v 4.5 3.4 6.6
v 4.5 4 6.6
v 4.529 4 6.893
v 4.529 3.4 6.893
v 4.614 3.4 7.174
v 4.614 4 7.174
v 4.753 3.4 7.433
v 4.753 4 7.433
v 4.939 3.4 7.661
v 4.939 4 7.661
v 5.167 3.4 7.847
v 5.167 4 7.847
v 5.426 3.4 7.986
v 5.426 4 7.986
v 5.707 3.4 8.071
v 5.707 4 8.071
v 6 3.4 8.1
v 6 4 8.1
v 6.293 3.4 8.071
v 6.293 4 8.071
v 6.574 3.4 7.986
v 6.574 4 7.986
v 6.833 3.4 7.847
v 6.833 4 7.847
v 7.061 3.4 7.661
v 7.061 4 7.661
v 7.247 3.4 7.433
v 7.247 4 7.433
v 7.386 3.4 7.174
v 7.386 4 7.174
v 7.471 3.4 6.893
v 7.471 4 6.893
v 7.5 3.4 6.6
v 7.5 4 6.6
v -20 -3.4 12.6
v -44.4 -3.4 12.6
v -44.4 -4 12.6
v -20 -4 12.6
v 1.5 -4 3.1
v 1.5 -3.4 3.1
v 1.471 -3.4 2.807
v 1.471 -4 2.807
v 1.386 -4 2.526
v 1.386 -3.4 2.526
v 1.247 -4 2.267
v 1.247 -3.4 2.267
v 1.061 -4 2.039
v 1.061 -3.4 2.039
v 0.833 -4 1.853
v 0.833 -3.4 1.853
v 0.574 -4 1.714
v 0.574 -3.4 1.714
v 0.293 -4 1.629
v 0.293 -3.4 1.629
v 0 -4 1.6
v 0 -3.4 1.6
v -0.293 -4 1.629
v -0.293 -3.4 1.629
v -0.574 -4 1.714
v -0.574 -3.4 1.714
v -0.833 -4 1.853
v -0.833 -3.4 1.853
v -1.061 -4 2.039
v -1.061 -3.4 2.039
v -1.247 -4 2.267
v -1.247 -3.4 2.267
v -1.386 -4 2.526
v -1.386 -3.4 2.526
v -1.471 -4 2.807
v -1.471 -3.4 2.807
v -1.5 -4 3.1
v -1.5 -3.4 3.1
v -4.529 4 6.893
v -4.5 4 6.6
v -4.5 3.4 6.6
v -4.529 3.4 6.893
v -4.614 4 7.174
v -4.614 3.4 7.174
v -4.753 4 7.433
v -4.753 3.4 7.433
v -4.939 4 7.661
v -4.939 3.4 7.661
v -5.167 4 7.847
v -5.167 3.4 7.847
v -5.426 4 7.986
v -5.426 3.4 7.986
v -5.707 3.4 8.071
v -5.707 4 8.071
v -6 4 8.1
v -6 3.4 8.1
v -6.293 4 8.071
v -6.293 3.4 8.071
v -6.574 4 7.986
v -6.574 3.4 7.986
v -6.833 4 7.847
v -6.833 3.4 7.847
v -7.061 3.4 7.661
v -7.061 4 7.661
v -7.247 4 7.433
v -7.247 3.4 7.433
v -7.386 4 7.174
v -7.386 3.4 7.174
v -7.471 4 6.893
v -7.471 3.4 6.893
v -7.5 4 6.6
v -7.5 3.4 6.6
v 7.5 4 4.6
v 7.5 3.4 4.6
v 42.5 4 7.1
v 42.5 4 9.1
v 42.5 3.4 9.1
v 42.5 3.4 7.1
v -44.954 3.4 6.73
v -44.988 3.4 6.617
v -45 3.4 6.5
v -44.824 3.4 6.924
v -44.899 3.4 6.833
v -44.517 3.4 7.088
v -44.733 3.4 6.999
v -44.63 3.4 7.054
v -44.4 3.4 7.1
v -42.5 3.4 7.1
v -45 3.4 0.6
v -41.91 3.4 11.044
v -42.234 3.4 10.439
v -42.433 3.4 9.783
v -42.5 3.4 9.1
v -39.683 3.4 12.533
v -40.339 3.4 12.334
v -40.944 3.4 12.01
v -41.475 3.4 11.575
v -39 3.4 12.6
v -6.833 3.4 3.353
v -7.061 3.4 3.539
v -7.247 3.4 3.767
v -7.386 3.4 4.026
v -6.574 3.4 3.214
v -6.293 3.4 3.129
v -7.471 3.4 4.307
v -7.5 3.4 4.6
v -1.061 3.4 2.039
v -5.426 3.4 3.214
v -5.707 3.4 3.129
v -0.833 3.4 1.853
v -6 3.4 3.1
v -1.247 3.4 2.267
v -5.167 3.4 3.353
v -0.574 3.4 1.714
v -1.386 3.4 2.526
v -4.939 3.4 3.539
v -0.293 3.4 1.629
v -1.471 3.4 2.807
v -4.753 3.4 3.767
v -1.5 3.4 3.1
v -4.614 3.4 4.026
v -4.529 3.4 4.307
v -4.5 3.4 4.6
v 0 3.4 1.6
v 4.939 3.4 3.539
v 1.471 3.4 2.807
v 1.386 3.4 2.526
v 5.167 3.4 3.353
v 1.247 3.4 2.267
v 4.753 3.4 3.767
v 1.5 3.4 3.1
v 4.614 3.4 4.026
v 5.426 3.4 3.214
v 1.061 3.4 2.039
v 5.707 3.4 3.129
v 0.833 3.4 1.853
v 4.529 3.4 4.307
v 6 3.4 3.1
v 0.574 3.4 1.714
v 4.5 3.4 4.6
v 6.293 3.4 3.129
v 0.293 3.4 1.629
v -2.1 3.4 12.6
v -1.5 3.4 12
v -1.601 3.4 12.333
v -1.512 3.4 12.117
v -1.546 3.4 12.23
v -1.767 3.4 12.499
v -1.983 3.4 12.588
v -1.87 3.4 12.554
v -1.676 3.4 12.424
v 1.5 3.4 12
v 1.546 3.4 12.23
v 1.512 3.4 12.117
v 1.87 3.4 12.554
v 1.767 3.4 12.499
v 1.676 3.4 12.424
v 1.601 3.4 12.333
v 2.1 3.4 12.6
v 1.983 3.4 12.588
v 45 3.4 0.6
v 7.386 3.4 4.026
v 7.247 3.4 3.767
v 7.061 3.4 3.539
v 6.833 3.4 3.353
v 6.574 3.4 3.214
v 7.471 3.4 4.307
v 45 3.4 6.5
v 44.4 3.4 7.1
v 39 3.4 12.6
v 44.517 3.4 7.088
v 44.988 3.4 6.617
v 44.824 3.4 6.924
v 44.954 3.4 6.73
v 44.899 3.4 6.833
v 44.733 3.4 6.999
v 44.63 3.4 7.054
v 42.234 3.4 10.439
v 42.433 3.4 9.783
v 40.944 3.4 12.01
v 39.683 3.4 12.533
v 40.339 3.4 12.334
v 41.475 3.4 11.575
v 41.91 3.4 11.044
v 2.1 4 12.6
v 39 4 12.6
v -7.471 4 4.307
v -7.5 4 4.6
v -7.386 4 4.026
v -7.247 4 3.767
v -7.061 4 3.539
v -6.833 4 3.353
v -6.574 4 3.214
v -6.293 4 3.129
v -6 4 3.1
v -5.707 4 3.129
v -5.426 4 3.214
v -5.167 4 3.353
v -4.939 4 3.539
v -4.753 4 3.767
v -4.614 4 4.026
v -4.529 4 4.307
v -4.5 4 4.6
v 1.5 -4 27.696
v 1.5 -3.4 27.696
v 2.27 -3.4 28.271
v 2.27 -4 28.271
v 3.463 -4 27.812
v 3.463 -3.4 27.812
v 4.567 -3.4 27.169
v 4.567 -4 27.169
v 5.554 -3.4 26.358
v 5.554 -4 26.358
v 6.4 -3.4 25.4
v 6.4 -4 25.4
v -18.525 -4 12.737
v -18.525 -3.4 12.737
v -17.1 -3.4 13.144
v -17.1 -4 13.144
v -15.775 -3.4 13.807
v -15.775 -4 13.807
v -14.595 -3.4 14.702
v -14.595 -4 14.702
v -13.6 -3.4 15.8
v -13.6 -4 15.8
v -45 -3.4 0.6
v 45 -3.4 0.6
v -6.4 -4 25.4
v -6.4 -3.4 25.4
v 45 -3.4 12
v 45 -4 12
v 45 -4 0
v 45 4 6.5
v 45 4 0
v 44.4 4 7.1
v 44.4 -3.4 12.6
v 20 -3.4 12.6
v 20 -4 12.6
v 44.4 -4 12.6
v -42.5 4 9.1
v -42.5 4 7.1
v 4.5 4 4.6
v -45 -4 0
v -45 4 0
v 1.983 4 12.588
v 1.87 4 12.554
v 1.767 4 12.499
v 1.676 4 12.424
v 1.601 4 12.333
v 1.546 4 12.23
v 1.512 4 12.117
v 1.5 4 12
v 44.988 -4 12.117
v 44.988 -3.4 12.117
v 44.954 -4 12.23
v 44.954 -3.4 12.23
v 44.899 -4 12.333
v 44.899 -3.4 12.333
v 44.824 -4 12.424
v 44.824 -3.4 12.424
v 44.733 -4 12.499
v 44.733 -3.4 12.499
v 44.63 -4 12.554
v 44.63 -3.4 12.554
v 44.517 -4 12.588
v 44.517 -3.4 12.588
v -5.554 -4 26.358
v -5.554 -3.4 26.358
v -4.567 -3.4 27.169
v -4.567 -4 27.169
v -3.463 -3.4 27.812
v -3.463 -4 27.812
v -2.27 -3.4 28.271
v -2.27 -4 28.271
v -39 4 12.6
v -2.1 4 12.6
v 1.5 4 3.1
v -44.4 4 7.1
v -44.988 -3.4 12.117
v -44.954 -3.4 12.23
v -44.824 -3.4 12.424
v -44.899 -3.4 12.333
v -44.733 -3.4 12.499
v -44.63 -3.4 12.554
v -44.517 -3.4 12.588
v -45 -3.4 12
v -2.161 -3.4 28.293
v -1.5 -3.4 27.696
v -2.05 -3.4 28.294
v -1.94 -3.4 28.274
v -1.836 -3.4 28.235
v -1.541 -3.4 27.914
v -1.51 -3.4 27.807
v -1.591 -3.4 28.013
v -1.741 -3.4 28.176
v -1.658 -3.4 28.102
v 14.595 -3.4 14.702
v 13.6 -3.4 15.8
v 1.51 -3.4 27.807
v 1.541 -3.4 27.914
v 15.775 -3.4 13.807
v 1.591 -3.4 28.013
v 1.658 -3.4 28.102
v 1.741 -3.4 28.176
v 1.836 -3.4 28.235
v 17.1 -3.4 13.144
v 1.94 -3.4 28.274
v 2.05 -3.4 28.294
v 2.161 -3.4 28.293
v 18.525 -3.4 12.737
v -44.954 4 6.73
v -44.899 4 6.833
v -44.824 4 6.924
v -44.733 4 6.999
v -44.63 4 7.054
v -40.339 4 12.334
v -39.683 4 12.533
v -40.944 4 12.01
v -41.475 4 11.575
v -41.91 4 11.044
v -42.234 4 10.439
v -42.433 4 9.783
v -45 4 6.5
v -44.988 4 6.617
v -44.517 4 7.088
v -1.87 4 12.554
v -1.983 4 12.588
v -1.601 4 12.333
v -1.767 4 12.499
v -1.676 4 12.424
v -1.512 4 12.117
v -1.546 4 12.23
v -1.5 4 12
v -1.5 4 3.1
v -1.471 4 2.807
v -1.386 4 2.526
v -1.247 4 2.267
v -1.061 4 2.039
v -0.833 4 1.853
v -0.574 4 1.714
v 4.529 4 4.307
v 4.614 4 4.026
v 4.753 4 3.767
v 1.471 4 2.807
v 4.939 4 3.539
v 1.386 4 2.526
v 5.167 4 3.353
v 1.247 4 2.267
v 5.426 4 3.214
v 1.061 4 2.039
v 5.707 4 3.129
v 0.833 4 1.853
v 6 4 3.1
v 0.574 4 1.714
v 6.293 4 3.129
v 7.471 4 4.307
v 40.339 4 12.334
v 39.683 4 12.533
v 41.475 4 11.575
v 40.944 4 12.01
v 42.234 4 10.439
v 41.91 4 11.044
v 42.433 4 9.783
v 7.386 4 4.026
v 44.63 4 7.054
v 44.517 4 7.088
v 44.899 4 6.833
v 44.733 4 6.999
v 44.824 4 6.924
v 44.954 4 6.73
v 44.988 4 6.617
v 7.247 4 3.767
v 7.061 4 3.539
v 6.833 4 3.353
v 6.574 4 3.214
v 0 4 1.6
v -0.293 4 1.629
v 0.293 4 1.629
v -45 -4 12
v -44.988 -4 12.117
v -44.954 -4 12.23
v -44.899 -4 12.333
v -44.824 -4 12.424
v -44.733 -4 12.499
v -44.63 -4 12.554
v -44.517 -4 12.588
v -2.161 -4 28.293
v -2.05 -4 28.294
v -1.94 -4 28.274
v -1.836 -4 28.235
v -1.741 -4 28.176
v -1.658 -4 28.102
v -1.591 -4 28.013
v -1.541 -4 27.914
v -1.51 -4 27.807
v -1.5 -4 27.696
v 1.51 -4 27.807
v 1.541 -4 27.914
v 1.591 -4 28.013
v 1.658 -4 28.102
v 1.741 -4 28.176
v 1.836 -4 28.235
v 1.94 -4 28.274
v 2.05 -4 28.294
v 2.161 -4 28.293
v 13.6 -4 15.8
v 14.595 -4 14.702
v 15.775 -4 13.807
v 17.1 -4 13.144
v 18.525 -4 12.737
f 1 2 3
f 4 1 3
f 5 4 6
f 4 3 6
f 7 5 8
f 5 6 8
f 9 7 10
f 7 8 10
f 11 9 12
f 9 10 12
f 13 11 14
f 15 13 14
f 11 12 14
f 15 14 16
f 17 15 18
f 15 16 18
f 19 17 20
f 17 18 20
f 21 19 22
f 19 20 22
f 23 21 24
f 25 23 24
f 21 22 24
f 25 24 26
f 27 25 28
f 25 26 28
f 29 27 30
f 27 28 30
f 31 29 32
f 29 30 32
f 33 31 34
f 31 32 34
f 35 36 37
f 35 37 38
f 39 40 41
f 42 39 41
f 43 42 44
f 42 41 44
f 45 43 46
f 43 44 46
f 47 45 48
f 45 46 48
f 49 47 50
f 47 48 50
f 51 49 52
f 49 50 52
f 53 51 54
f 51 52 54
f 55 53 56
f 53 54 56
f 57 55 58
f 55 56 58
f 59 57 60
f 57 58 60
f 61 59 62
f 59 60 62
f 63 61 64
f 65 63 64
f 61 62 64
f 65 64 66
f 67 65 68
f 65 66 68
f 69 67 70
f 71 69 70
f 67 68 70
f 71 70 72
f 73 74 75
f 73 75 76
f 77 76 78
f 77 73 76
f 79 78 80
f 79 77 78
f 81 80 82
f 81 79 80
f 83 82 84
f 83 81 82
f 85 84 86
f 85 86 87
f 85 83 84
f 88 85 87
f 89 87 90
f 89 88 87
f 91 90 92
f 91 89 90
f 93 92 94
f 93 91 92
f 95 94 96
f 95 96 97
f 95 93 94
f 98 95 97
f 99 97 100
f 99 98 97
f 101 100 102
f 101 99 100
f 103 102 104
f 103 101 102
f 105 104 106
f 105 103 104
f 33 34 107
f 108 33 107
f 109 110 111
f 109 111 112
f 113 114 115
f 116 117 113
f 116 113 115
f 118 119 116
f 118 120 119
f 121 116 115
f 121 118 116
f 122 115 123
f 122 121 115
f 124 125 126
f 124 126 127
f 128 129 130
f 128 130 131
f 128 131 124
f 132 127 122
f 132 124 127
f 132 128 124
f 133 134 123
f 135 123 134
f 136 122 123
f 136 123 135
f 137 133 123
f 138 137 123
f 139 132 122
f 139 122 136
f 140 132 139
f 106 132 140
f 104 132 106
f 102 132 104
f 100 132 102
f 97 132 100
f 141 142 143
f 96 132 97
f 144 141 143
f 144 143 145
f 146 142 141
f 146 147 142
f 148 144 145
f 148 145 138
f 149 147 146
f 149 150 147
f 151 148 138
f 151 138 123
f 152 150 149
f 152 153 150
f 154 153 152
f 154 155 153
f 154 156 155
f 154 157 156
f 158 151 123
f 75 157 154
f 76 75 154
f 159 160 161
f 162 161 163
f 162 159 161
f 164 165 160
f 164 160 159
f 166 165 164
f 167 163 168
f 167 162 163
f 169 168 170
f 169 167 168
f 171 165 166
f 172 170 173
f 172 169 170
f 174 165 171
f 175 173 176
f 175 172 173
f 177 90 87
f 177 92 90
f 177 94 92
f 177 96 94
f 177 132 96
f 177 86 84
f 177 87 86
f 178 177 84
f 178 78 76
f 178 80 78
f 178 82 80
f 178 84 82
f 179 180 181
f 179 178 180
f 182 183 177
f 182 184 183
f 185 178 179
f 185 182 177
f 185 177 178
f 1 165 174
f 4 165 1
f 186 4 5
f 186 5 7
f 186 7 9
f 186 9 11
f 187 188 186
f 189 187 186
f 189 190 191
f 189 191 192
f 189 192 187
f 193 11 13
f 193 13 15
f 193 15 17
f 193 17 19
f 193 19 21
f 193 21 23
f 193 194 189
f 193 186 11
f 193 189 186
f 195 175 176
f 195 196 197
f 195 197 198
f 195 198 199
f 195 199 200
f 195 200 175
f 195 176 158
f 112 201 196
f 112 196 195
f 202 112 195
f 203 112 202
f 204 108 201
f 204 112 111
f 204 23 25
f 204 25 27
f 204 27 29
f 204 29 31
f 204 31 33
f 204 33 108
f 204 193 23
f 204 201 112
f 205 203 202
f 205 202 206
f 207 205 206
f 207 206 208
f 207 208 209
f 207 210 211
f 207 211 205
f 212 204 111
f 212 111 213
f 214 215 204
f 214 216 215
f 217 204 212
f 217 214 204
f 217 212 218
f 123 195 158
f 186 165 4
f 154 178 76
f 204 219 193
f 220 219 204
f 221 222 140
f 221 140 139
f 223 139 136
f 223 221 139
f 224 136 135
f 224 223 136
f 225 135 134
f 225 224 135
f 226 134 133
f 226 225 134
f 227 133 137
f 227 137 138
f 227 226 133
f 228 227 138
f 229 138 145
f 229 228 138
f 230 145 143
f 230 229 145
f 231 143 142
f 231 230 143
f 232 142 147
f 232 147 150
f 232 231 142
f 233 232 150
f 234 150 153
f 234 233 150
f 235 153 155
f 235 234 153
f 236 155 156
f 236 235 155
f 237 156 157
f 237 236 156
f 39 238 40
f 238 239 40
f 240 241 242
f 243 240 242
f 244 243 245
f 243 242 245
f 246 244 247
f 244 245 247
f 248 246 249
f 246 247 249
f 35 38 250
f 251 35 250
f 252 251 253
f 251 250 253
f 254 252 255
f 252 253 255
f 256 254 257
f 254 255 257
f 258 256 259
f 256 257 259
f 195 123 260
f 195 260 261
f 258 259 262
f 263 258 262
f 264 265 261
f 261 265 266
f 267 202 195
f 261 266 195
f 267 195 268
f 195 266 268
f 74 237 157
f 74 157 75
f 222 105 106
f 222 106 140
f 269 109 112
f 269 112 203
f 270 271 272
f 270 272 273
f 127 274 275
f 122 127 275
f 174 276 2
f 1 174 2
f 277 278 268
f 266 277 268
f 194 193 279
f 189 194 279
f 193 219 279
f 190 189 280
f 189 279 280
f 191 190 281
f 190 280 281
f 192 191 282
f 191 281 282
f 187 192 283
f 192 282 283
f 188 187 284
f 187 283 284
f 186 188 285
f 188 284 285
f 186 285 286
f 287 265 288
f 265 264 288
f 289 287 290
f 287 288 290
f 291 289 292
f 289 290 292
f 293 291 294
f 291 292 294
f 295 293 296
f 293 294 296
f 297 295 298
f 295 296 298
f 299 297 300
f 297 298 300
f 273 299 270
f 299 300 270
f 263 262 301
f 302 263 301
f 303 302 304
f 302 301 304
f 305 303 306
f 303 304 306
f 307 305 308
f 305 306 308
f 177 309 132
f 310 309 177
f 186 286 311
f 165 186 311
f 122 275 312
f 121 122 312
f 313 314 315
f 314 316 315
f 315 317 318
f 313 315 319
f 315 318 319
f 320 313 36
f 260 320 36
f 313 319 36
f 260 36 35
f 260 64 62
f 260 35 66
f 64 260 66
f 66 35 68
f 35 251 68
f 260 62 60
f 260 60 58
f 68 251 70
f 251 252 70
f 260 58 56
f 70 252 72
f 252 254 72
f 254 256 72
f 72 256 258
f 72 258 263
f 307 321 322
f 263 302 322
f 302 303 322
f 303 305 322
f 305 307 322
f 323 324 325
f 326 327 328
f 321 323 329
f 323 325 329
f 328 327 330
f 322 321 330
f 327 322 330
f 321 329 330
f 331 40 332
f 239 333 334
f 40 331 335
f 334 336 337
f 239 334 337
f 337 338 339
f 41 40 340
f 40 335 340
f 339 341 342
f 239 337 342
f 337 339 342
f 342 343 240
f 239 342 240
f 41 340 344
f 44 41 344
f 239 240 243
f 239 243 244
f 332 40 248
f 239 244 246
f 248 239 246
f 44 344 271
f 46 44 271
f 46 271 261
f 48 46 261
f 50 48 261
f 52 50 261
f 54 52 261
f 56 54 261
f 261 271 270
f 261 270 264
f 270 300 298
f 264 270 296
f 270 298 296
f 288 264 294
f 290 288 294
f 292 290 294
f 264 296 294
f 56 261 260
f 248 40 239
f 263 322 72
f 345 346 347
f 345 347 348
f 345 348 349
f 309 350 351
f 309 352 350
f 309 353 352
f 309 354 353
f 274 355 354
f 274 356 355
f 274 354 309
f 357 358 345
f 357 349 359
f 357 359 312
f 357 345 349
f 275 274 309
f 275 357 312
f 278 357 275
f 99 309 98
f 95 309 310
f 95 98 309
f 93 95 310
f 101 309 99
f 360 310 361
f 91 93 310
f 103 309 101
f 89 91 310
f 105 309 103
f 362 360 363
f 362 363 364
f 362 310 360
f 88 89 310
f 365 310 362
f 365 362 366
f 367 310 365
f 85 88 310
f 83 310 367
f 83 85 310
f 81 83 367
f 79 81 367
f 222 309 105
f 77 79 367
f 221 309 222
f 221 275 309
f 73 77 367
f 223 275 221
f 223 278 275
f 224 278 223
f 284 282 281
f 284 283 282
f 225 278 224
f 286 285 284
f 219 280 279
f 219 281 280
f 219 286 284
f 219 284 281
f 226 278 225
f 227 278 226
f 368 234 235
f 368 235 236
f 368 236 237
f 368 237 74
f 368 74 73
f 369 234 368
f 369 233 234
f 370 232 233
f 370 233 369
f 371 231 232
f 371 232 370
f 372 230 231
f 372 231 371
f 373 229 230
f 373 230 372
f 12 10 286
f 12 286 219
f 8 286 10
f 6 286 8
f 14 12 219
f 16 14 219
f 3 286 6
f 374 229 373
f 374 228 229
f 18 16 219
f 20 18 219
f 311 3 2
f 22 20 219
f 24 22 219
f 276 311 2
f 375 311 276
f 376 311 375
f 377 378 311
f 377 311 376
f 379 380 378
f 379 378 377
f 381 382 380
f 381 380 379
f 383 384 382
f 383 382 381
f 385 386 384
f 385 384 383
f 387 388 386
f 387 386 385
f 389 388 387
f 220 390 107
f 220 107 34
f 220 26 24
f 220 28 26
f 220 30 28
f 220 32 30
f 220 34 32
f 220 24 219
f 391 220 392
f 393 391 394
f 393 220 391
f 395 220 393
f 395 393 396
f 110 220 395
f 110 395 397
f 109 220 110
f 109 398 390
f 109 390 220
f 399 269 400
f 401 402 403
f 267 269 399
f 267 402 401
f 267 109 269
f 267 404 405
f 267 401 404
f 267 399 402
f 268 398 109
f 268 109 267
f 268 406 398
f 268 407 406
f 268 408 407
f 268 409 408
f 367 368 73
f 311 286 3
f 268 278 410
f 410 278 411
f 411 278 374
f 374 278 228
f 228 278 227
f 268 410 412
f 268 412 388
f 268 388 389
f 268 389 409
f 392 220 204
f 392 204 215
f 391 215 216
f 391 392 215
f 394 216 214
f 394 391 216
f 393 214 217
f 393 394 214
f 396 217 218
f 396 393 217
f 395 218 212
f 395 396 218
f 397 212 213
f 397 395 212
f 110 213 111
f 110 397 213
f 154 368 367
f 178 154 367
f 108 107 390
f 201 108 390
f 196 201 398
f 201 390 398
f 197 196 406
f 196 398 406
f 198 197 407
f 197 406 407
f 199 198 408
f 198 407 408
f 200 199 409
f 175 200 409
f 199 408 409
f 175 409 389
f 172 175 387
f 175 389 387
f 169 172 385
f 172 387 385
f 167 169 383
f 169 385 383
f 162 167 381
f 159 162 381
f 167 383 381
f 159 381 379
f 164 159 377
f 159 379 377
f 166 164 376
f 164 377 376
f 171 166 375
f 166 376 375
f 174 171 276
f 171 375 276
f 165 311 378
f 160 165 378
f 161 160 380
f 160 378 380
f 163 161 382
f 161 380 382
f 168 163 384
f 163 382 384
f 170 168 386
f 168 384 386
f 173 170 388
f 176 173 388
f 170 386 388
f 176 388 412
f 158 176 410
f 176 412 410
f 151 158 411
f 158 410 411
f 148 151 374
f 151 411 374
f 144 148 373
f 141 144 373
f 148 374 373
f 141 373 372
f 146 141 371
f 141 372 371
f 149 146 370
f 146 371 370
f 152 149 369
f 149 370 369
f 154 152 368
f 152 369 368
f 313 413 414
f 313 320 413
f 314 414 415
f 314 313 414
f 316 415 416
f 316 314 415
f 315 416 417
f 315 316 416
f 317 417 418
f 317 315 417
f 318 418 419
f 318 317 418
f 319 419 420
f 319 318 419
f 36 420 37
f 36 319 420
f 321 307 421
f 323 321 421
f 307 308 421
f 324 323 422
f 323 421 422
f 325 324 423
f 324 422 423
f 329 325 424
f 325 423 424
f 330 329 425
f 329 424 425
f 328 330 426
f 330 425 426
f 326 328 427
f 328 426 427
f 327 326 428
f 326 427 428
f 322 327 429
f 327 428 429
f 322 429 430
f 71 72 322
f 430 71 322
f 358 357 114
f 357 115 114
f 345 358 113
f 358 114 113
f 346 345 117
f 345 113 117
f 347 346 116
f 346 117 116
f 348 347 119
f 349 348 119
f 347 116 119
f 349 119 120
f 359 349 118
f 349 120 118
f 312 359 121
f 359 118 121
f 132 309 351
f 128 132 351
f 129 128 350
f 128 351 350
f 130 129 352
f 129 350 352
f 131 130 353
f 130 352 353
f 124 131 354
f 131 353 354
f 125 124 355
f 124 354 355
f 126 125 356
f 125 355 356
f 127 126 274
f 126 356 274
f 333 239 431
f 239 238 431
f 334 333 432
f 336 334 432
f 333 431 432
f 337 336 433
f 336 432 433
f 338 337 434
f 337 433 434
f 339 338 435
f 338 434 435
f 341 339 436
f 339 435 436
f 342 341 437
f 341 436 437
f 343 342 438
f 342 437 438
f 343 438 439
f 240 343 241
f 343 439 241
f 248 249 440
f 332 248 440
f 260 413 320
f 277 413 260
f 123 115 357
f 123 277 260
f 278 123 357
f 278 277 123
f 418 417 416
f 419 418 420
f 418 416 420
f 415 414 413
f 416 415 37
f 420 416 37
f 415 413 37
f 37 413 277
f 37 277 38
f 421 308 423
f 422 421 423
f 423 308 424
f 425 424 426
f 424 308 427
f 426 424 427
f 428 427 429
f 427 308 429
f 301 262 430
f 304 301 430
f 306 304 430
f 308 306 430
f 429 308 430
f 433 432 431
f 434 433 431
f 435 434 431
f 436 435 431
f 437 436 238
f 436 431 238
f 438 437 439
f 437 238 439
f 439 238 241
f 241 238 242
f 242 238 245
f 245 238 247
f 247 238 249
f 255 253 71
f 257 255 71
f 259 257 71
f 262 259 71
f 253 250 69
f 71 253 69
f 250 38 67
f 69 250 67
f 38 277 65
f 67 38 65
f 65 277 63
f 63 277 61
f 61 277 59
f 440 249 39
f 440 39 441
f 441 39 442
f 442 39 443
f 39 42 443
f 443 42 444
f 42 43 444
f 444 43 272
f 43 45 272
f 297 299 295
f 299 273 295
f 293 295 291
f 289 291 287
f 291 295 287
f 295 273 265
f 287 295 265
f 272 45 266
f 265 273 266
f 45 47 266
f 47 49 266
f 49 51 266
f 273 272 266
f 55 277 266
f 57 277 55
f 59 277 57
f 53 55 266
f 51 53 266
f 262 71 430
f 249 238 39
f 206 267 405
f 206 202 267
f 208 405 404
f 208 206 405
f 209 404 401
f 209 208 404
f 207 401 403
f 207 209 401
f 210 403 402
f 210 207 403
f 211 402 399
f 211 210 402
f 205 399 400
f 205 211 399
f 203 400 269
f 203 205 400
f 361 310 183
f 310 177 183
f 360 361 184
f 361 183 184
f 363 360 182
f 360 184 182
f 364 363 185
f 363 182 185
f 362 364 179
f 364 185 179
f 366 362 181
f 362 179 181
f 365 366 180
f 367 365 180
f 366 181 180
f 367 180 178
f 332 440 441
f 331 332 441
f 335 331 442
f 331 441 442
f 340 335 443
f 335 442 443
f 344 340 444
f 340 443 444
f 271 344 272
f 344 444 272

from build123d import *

# Parameters (mm, degrees)
SKETCH1_W           = 90
SKETCH1_H           = 8
BOSS_EXTRUDE1_DEPTH = 12.6
SKETCH2_W           = 90
SKETCH2_H           = 6.8
CUT_EXTRUDE1_DEPTH  = 12
BOSS_EXTRUDE2_DEPTH = 0.6
CUT_EXTRUDE2_DEPTH  = 9
CUT_EXTRUDE4_DEPTH  = 0.6
CUT_EXTRUDE5_DEPTH  = 0.6
FILLET1_R           = 0.6


with BuildPart() as part:
    # Sketch1 → Boss-Extrude1 (new body)
    with BuildSketch(Plane.XY):
        Rectangle(SKETCH1_W, SKETCH1_H)
    extrude(amount=BOSS_EXTRUDE1_DEPTH)

    # Sketch2 → Cut-Extrude1 (cut)
    with BuildSketch(Plane.XY.offset(12.6)):
        Rectangle(SKETCH2_W, SKETCH2_H)
    extrude(amount=-CUT_EXTRUDE1_DEPTH, mode=Mode.SUBTRACT)

    # Sketch8 → Boss-Extrude2 (add)
    with BuildSketch(Plane.XZ.offset(4)):
        with BuildLine():
            Line((6.4, 25.4), (13.6, 15.8))
            ThreePointArc((13.6, 15.8), (16.422291236, 13.444582472), (20, 12.6))
            Line((20, 12.6), (-20, 12.6))
            ThreePointArc((-20, 12.6), (-16.422291236, 13.444582472), (-13.6, 15.8))
            Line((-13.6, 15.8), (-6.4, 25.4))
            ThreePointArc((-6.4, 25.4), (0, 28.6), (6.4, 25.4))
        make_face()
    extrude(amount=-BOSS_EXTRUDE2_DEPTH)

    # Sketch4 → Cut-Extrude2 (cut, through all)
    with BuildSketch(Plane(origin=(0, 4, 0), x_dir=(1, 0, 0), z_dir=(0, 1, 0))):
        with BuildLine():
            Line((-1.5, -3.1), (-1.5, -32.05439328))
            Line((-1.5, -32.05439328), (1.5, -32.05439328))
            Line((1.5, -32.05439328), (1.5, -3.1))
            ThreePointArc((1.5, -3.1), (0, -1.6), (-1.5, -3.1))
        make_face()
    extrude(amount=-CUT_EXTRUDE2_DEPTH, mode=Mode.SUBTRACT)

    # Sketch6 → Cut-Extrude4 (cut)
    with BuildSketch(Plane(origin=(0, 4, 0), x_dir=(1, 0, 0), z_dir=(0, 1, 0))):
        with BuildLine():
            Line((-42.5, -9.1), (-42.5, -7.1))
            Line((-42.5, -7.1), (-45, -7.1))
            Line((-45, -7.1), (-45, -12.6))
            Line((-45, -12.6), (-39, -12.6))
            ThreePointArc((-39, -12.6), (-41.474873734, -11.574873734), (-42.5, -9.1))
        make_face()
    cut_extrude4 = extrude(amount=-CUT_EXTRUDE4_DEPTH, mode=Mode.SUBTRACT)

    # Mirror1: Cut-Extrude4 across plane
    add(cut_extrude4.mirror(Plane(origin=(0, 0, 0), x_dir=(0, 0, 1), z_dir=(1, 0, 0))), mode=Mode.SUBTRACT)

    # Sketch7 → Cut-Extrude5 (cut)
    with BuildSketch(Plane(origin=(0, 4, 0), x_dir=(1, 0, 0), z_dir=(0, 1, 0))):
        with BuildLine():
            Line((-4.5, -4.6), (-4.5, -6.6))
            ThreePointArc((-4.5, -6.6), (-6, -8.1), (-7.5, -6.6))
            Line((-7.5, -6.6), (-7.5, -4.6))
            ThreePointArc((-7.5, -4.6), (-6, -3.1), (-4.5, -4.6))
        make_face()
    cut_extrude5 = extrude(amount=-CUT_EXTRUDE5_DEPTH, mode=Mode.SUBTRACT)

    # Mirror2: Cut-Extrude5 across plane
    add(cut_extrude5.mirror(Plane(origin=(0, 0, 0), x_dir=(0, 0, 1), z_dir=(1, 0, 0))), mode=Mode.SUBTRACT)

    # Fillet1
    fillet1_edges = [part.edges().sort_by_distance(p)[0] for p in [
        (45, -3.7, 12.6),
        (-45, -3.7, 12.6),
        (-1.5, -3.7, 28.458116823),
        (1.5, -3.7, 28.458116823),
        (1.5, 3.7, 12.6),
        (-1.5, 3.7, 12.6),
        (-45, 3.7, 7.1),
        (45, 3.7, 7.1),
    ]]
    fillet(fillet1_edges, radius=FILLET1_R)


solid = part.part
